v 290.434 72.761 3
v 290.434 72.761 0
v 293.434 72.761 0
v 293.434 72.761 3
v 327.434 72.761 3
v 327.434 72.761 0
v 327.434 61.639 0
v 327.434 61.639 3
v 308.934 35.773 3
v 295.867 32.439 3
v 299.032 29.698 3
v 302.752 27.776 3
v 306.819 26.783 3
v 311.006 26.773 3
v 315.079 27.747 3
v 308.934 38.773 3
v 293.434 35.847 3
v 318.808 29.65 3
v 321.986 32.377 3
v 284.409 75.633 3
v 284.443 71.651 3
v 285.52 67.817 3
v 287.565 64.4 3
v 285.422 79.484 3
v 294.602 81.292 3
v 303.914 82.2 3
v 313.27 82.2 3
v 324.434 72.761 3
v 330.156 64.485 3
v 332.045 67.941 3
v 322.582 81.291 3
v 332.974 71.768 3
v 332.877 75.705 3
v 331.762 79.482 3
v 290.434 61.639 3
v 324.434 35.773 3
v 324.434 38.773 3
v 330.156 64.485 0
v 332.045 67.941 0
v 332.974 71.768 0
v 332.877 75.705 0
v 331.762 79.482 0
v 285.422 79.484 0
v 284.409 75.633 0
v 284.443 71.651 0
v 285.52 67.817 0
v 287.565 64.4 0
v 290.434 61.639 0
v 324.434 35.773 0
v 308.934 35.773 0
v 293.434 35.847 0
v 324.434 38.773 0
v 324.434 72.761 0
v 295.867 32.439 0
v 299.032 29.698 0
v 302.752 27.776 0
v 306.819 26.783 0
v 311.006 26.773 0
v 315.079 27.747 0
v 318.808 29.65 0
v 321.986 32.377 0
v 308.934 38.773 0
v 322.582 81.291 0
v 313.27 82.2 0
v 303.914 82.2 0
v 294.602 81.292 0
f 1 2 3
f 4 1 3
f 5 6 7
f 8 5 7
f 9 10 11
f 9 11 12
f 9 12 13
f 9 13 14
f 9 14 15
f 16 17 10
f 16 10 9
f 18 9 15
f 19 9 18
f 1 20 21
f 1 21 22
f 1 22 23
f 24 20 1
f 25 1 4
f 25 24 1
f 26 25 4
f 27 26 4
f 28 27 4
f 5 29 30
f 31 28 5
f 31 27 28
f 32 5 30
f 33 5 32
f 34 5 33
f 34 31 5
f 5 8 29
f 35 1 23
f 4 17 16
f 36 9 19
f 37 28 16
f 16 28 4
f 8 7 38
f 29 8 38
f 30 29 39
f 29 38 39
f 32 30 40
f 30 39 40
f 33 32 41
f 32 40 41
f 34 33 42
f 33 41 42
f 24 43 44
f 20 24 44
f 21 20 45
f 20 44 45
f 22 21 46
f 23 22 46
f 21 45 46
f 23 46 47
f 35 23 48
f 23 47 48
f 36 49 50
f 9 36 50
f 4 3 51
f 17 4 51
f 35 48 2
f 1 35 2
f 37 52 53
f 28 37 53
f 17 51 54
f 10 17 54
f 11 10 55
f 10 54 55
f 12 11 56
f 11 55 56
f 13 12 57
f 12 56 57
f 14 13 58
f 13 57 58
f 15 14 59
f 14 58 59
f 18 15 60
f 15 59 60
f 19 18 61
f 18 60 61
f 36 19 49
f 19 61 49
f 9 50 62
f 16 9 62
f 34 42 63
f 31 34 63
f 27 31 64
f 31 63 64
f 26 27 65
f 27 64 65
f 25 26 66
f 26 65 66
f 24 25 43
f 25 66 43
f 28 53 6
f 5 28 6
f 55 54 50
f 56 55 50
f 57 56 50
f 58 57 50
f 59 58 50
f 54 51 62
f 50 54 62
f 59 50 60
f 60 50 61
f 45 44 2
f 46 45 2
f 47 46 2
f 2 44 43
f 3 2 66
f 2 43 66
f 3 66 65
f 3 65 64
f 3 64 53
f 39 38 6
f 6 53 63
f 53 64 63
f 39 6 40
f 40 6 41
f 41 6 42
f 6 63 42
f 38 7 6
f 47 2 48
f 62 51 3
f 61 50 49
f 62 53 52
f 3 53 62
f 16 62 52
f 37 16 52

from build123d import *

# Parameters (mm, degrees)
BASE_EXTRUDE_DEPTH = 3


with BuildPart() as part:
    # Sketch1 → Base-Extrude (new body)
    with BuildSketch(Plane.XY):
        with BuildLine():
            Line((327.434465654, 72.761168779), (327.434465654, 61.638791555))
            ThreePointArc((327.434465654, 61.638791555), (332.635220006, 69.823914354), (331.761917416, 79.482145231))
            ThreePointArc((331.761917416, 79.482145231), (308.592008451, 82.313990162), (285.421828233, 79.484365486))
            ThreePointArc((285.421828233, 79.484365486), (284.853925586, 69.698061489), (290.434465654, 61.638791555))
            Line((290.434465654, 61.638791555), (290.434465654, 72.761168779))
            Line((290.434465654, 72.761168779), (293.434465654, 72.761168779))
            Line((293.434465654, 72.761168779), (293.434465654, 35.847162793))
            ThreePointArc((293.434465654, 35.847162793), (308.912610373, 26.65368117), (324.434465654, 35.773170023))
            Line((324.434465654, 35.773170023), (308.934465654, 35.773170023))
            Line((308.934465654, 35.773170023), (308.934465654, 38.773170023))
            Line((308.934465654, 38.773170023), (324.434465654, 38.773170023))
            Line((324.434465654, 38.773170023), (324.434465654, 72.761168779))
            Line((324.434465654, 72.761168779), (327.434465654, 72.761168779))
        make_face()
    extrude(amount=BASE_EXTRUDE_DEPTH)


solid = part.part
